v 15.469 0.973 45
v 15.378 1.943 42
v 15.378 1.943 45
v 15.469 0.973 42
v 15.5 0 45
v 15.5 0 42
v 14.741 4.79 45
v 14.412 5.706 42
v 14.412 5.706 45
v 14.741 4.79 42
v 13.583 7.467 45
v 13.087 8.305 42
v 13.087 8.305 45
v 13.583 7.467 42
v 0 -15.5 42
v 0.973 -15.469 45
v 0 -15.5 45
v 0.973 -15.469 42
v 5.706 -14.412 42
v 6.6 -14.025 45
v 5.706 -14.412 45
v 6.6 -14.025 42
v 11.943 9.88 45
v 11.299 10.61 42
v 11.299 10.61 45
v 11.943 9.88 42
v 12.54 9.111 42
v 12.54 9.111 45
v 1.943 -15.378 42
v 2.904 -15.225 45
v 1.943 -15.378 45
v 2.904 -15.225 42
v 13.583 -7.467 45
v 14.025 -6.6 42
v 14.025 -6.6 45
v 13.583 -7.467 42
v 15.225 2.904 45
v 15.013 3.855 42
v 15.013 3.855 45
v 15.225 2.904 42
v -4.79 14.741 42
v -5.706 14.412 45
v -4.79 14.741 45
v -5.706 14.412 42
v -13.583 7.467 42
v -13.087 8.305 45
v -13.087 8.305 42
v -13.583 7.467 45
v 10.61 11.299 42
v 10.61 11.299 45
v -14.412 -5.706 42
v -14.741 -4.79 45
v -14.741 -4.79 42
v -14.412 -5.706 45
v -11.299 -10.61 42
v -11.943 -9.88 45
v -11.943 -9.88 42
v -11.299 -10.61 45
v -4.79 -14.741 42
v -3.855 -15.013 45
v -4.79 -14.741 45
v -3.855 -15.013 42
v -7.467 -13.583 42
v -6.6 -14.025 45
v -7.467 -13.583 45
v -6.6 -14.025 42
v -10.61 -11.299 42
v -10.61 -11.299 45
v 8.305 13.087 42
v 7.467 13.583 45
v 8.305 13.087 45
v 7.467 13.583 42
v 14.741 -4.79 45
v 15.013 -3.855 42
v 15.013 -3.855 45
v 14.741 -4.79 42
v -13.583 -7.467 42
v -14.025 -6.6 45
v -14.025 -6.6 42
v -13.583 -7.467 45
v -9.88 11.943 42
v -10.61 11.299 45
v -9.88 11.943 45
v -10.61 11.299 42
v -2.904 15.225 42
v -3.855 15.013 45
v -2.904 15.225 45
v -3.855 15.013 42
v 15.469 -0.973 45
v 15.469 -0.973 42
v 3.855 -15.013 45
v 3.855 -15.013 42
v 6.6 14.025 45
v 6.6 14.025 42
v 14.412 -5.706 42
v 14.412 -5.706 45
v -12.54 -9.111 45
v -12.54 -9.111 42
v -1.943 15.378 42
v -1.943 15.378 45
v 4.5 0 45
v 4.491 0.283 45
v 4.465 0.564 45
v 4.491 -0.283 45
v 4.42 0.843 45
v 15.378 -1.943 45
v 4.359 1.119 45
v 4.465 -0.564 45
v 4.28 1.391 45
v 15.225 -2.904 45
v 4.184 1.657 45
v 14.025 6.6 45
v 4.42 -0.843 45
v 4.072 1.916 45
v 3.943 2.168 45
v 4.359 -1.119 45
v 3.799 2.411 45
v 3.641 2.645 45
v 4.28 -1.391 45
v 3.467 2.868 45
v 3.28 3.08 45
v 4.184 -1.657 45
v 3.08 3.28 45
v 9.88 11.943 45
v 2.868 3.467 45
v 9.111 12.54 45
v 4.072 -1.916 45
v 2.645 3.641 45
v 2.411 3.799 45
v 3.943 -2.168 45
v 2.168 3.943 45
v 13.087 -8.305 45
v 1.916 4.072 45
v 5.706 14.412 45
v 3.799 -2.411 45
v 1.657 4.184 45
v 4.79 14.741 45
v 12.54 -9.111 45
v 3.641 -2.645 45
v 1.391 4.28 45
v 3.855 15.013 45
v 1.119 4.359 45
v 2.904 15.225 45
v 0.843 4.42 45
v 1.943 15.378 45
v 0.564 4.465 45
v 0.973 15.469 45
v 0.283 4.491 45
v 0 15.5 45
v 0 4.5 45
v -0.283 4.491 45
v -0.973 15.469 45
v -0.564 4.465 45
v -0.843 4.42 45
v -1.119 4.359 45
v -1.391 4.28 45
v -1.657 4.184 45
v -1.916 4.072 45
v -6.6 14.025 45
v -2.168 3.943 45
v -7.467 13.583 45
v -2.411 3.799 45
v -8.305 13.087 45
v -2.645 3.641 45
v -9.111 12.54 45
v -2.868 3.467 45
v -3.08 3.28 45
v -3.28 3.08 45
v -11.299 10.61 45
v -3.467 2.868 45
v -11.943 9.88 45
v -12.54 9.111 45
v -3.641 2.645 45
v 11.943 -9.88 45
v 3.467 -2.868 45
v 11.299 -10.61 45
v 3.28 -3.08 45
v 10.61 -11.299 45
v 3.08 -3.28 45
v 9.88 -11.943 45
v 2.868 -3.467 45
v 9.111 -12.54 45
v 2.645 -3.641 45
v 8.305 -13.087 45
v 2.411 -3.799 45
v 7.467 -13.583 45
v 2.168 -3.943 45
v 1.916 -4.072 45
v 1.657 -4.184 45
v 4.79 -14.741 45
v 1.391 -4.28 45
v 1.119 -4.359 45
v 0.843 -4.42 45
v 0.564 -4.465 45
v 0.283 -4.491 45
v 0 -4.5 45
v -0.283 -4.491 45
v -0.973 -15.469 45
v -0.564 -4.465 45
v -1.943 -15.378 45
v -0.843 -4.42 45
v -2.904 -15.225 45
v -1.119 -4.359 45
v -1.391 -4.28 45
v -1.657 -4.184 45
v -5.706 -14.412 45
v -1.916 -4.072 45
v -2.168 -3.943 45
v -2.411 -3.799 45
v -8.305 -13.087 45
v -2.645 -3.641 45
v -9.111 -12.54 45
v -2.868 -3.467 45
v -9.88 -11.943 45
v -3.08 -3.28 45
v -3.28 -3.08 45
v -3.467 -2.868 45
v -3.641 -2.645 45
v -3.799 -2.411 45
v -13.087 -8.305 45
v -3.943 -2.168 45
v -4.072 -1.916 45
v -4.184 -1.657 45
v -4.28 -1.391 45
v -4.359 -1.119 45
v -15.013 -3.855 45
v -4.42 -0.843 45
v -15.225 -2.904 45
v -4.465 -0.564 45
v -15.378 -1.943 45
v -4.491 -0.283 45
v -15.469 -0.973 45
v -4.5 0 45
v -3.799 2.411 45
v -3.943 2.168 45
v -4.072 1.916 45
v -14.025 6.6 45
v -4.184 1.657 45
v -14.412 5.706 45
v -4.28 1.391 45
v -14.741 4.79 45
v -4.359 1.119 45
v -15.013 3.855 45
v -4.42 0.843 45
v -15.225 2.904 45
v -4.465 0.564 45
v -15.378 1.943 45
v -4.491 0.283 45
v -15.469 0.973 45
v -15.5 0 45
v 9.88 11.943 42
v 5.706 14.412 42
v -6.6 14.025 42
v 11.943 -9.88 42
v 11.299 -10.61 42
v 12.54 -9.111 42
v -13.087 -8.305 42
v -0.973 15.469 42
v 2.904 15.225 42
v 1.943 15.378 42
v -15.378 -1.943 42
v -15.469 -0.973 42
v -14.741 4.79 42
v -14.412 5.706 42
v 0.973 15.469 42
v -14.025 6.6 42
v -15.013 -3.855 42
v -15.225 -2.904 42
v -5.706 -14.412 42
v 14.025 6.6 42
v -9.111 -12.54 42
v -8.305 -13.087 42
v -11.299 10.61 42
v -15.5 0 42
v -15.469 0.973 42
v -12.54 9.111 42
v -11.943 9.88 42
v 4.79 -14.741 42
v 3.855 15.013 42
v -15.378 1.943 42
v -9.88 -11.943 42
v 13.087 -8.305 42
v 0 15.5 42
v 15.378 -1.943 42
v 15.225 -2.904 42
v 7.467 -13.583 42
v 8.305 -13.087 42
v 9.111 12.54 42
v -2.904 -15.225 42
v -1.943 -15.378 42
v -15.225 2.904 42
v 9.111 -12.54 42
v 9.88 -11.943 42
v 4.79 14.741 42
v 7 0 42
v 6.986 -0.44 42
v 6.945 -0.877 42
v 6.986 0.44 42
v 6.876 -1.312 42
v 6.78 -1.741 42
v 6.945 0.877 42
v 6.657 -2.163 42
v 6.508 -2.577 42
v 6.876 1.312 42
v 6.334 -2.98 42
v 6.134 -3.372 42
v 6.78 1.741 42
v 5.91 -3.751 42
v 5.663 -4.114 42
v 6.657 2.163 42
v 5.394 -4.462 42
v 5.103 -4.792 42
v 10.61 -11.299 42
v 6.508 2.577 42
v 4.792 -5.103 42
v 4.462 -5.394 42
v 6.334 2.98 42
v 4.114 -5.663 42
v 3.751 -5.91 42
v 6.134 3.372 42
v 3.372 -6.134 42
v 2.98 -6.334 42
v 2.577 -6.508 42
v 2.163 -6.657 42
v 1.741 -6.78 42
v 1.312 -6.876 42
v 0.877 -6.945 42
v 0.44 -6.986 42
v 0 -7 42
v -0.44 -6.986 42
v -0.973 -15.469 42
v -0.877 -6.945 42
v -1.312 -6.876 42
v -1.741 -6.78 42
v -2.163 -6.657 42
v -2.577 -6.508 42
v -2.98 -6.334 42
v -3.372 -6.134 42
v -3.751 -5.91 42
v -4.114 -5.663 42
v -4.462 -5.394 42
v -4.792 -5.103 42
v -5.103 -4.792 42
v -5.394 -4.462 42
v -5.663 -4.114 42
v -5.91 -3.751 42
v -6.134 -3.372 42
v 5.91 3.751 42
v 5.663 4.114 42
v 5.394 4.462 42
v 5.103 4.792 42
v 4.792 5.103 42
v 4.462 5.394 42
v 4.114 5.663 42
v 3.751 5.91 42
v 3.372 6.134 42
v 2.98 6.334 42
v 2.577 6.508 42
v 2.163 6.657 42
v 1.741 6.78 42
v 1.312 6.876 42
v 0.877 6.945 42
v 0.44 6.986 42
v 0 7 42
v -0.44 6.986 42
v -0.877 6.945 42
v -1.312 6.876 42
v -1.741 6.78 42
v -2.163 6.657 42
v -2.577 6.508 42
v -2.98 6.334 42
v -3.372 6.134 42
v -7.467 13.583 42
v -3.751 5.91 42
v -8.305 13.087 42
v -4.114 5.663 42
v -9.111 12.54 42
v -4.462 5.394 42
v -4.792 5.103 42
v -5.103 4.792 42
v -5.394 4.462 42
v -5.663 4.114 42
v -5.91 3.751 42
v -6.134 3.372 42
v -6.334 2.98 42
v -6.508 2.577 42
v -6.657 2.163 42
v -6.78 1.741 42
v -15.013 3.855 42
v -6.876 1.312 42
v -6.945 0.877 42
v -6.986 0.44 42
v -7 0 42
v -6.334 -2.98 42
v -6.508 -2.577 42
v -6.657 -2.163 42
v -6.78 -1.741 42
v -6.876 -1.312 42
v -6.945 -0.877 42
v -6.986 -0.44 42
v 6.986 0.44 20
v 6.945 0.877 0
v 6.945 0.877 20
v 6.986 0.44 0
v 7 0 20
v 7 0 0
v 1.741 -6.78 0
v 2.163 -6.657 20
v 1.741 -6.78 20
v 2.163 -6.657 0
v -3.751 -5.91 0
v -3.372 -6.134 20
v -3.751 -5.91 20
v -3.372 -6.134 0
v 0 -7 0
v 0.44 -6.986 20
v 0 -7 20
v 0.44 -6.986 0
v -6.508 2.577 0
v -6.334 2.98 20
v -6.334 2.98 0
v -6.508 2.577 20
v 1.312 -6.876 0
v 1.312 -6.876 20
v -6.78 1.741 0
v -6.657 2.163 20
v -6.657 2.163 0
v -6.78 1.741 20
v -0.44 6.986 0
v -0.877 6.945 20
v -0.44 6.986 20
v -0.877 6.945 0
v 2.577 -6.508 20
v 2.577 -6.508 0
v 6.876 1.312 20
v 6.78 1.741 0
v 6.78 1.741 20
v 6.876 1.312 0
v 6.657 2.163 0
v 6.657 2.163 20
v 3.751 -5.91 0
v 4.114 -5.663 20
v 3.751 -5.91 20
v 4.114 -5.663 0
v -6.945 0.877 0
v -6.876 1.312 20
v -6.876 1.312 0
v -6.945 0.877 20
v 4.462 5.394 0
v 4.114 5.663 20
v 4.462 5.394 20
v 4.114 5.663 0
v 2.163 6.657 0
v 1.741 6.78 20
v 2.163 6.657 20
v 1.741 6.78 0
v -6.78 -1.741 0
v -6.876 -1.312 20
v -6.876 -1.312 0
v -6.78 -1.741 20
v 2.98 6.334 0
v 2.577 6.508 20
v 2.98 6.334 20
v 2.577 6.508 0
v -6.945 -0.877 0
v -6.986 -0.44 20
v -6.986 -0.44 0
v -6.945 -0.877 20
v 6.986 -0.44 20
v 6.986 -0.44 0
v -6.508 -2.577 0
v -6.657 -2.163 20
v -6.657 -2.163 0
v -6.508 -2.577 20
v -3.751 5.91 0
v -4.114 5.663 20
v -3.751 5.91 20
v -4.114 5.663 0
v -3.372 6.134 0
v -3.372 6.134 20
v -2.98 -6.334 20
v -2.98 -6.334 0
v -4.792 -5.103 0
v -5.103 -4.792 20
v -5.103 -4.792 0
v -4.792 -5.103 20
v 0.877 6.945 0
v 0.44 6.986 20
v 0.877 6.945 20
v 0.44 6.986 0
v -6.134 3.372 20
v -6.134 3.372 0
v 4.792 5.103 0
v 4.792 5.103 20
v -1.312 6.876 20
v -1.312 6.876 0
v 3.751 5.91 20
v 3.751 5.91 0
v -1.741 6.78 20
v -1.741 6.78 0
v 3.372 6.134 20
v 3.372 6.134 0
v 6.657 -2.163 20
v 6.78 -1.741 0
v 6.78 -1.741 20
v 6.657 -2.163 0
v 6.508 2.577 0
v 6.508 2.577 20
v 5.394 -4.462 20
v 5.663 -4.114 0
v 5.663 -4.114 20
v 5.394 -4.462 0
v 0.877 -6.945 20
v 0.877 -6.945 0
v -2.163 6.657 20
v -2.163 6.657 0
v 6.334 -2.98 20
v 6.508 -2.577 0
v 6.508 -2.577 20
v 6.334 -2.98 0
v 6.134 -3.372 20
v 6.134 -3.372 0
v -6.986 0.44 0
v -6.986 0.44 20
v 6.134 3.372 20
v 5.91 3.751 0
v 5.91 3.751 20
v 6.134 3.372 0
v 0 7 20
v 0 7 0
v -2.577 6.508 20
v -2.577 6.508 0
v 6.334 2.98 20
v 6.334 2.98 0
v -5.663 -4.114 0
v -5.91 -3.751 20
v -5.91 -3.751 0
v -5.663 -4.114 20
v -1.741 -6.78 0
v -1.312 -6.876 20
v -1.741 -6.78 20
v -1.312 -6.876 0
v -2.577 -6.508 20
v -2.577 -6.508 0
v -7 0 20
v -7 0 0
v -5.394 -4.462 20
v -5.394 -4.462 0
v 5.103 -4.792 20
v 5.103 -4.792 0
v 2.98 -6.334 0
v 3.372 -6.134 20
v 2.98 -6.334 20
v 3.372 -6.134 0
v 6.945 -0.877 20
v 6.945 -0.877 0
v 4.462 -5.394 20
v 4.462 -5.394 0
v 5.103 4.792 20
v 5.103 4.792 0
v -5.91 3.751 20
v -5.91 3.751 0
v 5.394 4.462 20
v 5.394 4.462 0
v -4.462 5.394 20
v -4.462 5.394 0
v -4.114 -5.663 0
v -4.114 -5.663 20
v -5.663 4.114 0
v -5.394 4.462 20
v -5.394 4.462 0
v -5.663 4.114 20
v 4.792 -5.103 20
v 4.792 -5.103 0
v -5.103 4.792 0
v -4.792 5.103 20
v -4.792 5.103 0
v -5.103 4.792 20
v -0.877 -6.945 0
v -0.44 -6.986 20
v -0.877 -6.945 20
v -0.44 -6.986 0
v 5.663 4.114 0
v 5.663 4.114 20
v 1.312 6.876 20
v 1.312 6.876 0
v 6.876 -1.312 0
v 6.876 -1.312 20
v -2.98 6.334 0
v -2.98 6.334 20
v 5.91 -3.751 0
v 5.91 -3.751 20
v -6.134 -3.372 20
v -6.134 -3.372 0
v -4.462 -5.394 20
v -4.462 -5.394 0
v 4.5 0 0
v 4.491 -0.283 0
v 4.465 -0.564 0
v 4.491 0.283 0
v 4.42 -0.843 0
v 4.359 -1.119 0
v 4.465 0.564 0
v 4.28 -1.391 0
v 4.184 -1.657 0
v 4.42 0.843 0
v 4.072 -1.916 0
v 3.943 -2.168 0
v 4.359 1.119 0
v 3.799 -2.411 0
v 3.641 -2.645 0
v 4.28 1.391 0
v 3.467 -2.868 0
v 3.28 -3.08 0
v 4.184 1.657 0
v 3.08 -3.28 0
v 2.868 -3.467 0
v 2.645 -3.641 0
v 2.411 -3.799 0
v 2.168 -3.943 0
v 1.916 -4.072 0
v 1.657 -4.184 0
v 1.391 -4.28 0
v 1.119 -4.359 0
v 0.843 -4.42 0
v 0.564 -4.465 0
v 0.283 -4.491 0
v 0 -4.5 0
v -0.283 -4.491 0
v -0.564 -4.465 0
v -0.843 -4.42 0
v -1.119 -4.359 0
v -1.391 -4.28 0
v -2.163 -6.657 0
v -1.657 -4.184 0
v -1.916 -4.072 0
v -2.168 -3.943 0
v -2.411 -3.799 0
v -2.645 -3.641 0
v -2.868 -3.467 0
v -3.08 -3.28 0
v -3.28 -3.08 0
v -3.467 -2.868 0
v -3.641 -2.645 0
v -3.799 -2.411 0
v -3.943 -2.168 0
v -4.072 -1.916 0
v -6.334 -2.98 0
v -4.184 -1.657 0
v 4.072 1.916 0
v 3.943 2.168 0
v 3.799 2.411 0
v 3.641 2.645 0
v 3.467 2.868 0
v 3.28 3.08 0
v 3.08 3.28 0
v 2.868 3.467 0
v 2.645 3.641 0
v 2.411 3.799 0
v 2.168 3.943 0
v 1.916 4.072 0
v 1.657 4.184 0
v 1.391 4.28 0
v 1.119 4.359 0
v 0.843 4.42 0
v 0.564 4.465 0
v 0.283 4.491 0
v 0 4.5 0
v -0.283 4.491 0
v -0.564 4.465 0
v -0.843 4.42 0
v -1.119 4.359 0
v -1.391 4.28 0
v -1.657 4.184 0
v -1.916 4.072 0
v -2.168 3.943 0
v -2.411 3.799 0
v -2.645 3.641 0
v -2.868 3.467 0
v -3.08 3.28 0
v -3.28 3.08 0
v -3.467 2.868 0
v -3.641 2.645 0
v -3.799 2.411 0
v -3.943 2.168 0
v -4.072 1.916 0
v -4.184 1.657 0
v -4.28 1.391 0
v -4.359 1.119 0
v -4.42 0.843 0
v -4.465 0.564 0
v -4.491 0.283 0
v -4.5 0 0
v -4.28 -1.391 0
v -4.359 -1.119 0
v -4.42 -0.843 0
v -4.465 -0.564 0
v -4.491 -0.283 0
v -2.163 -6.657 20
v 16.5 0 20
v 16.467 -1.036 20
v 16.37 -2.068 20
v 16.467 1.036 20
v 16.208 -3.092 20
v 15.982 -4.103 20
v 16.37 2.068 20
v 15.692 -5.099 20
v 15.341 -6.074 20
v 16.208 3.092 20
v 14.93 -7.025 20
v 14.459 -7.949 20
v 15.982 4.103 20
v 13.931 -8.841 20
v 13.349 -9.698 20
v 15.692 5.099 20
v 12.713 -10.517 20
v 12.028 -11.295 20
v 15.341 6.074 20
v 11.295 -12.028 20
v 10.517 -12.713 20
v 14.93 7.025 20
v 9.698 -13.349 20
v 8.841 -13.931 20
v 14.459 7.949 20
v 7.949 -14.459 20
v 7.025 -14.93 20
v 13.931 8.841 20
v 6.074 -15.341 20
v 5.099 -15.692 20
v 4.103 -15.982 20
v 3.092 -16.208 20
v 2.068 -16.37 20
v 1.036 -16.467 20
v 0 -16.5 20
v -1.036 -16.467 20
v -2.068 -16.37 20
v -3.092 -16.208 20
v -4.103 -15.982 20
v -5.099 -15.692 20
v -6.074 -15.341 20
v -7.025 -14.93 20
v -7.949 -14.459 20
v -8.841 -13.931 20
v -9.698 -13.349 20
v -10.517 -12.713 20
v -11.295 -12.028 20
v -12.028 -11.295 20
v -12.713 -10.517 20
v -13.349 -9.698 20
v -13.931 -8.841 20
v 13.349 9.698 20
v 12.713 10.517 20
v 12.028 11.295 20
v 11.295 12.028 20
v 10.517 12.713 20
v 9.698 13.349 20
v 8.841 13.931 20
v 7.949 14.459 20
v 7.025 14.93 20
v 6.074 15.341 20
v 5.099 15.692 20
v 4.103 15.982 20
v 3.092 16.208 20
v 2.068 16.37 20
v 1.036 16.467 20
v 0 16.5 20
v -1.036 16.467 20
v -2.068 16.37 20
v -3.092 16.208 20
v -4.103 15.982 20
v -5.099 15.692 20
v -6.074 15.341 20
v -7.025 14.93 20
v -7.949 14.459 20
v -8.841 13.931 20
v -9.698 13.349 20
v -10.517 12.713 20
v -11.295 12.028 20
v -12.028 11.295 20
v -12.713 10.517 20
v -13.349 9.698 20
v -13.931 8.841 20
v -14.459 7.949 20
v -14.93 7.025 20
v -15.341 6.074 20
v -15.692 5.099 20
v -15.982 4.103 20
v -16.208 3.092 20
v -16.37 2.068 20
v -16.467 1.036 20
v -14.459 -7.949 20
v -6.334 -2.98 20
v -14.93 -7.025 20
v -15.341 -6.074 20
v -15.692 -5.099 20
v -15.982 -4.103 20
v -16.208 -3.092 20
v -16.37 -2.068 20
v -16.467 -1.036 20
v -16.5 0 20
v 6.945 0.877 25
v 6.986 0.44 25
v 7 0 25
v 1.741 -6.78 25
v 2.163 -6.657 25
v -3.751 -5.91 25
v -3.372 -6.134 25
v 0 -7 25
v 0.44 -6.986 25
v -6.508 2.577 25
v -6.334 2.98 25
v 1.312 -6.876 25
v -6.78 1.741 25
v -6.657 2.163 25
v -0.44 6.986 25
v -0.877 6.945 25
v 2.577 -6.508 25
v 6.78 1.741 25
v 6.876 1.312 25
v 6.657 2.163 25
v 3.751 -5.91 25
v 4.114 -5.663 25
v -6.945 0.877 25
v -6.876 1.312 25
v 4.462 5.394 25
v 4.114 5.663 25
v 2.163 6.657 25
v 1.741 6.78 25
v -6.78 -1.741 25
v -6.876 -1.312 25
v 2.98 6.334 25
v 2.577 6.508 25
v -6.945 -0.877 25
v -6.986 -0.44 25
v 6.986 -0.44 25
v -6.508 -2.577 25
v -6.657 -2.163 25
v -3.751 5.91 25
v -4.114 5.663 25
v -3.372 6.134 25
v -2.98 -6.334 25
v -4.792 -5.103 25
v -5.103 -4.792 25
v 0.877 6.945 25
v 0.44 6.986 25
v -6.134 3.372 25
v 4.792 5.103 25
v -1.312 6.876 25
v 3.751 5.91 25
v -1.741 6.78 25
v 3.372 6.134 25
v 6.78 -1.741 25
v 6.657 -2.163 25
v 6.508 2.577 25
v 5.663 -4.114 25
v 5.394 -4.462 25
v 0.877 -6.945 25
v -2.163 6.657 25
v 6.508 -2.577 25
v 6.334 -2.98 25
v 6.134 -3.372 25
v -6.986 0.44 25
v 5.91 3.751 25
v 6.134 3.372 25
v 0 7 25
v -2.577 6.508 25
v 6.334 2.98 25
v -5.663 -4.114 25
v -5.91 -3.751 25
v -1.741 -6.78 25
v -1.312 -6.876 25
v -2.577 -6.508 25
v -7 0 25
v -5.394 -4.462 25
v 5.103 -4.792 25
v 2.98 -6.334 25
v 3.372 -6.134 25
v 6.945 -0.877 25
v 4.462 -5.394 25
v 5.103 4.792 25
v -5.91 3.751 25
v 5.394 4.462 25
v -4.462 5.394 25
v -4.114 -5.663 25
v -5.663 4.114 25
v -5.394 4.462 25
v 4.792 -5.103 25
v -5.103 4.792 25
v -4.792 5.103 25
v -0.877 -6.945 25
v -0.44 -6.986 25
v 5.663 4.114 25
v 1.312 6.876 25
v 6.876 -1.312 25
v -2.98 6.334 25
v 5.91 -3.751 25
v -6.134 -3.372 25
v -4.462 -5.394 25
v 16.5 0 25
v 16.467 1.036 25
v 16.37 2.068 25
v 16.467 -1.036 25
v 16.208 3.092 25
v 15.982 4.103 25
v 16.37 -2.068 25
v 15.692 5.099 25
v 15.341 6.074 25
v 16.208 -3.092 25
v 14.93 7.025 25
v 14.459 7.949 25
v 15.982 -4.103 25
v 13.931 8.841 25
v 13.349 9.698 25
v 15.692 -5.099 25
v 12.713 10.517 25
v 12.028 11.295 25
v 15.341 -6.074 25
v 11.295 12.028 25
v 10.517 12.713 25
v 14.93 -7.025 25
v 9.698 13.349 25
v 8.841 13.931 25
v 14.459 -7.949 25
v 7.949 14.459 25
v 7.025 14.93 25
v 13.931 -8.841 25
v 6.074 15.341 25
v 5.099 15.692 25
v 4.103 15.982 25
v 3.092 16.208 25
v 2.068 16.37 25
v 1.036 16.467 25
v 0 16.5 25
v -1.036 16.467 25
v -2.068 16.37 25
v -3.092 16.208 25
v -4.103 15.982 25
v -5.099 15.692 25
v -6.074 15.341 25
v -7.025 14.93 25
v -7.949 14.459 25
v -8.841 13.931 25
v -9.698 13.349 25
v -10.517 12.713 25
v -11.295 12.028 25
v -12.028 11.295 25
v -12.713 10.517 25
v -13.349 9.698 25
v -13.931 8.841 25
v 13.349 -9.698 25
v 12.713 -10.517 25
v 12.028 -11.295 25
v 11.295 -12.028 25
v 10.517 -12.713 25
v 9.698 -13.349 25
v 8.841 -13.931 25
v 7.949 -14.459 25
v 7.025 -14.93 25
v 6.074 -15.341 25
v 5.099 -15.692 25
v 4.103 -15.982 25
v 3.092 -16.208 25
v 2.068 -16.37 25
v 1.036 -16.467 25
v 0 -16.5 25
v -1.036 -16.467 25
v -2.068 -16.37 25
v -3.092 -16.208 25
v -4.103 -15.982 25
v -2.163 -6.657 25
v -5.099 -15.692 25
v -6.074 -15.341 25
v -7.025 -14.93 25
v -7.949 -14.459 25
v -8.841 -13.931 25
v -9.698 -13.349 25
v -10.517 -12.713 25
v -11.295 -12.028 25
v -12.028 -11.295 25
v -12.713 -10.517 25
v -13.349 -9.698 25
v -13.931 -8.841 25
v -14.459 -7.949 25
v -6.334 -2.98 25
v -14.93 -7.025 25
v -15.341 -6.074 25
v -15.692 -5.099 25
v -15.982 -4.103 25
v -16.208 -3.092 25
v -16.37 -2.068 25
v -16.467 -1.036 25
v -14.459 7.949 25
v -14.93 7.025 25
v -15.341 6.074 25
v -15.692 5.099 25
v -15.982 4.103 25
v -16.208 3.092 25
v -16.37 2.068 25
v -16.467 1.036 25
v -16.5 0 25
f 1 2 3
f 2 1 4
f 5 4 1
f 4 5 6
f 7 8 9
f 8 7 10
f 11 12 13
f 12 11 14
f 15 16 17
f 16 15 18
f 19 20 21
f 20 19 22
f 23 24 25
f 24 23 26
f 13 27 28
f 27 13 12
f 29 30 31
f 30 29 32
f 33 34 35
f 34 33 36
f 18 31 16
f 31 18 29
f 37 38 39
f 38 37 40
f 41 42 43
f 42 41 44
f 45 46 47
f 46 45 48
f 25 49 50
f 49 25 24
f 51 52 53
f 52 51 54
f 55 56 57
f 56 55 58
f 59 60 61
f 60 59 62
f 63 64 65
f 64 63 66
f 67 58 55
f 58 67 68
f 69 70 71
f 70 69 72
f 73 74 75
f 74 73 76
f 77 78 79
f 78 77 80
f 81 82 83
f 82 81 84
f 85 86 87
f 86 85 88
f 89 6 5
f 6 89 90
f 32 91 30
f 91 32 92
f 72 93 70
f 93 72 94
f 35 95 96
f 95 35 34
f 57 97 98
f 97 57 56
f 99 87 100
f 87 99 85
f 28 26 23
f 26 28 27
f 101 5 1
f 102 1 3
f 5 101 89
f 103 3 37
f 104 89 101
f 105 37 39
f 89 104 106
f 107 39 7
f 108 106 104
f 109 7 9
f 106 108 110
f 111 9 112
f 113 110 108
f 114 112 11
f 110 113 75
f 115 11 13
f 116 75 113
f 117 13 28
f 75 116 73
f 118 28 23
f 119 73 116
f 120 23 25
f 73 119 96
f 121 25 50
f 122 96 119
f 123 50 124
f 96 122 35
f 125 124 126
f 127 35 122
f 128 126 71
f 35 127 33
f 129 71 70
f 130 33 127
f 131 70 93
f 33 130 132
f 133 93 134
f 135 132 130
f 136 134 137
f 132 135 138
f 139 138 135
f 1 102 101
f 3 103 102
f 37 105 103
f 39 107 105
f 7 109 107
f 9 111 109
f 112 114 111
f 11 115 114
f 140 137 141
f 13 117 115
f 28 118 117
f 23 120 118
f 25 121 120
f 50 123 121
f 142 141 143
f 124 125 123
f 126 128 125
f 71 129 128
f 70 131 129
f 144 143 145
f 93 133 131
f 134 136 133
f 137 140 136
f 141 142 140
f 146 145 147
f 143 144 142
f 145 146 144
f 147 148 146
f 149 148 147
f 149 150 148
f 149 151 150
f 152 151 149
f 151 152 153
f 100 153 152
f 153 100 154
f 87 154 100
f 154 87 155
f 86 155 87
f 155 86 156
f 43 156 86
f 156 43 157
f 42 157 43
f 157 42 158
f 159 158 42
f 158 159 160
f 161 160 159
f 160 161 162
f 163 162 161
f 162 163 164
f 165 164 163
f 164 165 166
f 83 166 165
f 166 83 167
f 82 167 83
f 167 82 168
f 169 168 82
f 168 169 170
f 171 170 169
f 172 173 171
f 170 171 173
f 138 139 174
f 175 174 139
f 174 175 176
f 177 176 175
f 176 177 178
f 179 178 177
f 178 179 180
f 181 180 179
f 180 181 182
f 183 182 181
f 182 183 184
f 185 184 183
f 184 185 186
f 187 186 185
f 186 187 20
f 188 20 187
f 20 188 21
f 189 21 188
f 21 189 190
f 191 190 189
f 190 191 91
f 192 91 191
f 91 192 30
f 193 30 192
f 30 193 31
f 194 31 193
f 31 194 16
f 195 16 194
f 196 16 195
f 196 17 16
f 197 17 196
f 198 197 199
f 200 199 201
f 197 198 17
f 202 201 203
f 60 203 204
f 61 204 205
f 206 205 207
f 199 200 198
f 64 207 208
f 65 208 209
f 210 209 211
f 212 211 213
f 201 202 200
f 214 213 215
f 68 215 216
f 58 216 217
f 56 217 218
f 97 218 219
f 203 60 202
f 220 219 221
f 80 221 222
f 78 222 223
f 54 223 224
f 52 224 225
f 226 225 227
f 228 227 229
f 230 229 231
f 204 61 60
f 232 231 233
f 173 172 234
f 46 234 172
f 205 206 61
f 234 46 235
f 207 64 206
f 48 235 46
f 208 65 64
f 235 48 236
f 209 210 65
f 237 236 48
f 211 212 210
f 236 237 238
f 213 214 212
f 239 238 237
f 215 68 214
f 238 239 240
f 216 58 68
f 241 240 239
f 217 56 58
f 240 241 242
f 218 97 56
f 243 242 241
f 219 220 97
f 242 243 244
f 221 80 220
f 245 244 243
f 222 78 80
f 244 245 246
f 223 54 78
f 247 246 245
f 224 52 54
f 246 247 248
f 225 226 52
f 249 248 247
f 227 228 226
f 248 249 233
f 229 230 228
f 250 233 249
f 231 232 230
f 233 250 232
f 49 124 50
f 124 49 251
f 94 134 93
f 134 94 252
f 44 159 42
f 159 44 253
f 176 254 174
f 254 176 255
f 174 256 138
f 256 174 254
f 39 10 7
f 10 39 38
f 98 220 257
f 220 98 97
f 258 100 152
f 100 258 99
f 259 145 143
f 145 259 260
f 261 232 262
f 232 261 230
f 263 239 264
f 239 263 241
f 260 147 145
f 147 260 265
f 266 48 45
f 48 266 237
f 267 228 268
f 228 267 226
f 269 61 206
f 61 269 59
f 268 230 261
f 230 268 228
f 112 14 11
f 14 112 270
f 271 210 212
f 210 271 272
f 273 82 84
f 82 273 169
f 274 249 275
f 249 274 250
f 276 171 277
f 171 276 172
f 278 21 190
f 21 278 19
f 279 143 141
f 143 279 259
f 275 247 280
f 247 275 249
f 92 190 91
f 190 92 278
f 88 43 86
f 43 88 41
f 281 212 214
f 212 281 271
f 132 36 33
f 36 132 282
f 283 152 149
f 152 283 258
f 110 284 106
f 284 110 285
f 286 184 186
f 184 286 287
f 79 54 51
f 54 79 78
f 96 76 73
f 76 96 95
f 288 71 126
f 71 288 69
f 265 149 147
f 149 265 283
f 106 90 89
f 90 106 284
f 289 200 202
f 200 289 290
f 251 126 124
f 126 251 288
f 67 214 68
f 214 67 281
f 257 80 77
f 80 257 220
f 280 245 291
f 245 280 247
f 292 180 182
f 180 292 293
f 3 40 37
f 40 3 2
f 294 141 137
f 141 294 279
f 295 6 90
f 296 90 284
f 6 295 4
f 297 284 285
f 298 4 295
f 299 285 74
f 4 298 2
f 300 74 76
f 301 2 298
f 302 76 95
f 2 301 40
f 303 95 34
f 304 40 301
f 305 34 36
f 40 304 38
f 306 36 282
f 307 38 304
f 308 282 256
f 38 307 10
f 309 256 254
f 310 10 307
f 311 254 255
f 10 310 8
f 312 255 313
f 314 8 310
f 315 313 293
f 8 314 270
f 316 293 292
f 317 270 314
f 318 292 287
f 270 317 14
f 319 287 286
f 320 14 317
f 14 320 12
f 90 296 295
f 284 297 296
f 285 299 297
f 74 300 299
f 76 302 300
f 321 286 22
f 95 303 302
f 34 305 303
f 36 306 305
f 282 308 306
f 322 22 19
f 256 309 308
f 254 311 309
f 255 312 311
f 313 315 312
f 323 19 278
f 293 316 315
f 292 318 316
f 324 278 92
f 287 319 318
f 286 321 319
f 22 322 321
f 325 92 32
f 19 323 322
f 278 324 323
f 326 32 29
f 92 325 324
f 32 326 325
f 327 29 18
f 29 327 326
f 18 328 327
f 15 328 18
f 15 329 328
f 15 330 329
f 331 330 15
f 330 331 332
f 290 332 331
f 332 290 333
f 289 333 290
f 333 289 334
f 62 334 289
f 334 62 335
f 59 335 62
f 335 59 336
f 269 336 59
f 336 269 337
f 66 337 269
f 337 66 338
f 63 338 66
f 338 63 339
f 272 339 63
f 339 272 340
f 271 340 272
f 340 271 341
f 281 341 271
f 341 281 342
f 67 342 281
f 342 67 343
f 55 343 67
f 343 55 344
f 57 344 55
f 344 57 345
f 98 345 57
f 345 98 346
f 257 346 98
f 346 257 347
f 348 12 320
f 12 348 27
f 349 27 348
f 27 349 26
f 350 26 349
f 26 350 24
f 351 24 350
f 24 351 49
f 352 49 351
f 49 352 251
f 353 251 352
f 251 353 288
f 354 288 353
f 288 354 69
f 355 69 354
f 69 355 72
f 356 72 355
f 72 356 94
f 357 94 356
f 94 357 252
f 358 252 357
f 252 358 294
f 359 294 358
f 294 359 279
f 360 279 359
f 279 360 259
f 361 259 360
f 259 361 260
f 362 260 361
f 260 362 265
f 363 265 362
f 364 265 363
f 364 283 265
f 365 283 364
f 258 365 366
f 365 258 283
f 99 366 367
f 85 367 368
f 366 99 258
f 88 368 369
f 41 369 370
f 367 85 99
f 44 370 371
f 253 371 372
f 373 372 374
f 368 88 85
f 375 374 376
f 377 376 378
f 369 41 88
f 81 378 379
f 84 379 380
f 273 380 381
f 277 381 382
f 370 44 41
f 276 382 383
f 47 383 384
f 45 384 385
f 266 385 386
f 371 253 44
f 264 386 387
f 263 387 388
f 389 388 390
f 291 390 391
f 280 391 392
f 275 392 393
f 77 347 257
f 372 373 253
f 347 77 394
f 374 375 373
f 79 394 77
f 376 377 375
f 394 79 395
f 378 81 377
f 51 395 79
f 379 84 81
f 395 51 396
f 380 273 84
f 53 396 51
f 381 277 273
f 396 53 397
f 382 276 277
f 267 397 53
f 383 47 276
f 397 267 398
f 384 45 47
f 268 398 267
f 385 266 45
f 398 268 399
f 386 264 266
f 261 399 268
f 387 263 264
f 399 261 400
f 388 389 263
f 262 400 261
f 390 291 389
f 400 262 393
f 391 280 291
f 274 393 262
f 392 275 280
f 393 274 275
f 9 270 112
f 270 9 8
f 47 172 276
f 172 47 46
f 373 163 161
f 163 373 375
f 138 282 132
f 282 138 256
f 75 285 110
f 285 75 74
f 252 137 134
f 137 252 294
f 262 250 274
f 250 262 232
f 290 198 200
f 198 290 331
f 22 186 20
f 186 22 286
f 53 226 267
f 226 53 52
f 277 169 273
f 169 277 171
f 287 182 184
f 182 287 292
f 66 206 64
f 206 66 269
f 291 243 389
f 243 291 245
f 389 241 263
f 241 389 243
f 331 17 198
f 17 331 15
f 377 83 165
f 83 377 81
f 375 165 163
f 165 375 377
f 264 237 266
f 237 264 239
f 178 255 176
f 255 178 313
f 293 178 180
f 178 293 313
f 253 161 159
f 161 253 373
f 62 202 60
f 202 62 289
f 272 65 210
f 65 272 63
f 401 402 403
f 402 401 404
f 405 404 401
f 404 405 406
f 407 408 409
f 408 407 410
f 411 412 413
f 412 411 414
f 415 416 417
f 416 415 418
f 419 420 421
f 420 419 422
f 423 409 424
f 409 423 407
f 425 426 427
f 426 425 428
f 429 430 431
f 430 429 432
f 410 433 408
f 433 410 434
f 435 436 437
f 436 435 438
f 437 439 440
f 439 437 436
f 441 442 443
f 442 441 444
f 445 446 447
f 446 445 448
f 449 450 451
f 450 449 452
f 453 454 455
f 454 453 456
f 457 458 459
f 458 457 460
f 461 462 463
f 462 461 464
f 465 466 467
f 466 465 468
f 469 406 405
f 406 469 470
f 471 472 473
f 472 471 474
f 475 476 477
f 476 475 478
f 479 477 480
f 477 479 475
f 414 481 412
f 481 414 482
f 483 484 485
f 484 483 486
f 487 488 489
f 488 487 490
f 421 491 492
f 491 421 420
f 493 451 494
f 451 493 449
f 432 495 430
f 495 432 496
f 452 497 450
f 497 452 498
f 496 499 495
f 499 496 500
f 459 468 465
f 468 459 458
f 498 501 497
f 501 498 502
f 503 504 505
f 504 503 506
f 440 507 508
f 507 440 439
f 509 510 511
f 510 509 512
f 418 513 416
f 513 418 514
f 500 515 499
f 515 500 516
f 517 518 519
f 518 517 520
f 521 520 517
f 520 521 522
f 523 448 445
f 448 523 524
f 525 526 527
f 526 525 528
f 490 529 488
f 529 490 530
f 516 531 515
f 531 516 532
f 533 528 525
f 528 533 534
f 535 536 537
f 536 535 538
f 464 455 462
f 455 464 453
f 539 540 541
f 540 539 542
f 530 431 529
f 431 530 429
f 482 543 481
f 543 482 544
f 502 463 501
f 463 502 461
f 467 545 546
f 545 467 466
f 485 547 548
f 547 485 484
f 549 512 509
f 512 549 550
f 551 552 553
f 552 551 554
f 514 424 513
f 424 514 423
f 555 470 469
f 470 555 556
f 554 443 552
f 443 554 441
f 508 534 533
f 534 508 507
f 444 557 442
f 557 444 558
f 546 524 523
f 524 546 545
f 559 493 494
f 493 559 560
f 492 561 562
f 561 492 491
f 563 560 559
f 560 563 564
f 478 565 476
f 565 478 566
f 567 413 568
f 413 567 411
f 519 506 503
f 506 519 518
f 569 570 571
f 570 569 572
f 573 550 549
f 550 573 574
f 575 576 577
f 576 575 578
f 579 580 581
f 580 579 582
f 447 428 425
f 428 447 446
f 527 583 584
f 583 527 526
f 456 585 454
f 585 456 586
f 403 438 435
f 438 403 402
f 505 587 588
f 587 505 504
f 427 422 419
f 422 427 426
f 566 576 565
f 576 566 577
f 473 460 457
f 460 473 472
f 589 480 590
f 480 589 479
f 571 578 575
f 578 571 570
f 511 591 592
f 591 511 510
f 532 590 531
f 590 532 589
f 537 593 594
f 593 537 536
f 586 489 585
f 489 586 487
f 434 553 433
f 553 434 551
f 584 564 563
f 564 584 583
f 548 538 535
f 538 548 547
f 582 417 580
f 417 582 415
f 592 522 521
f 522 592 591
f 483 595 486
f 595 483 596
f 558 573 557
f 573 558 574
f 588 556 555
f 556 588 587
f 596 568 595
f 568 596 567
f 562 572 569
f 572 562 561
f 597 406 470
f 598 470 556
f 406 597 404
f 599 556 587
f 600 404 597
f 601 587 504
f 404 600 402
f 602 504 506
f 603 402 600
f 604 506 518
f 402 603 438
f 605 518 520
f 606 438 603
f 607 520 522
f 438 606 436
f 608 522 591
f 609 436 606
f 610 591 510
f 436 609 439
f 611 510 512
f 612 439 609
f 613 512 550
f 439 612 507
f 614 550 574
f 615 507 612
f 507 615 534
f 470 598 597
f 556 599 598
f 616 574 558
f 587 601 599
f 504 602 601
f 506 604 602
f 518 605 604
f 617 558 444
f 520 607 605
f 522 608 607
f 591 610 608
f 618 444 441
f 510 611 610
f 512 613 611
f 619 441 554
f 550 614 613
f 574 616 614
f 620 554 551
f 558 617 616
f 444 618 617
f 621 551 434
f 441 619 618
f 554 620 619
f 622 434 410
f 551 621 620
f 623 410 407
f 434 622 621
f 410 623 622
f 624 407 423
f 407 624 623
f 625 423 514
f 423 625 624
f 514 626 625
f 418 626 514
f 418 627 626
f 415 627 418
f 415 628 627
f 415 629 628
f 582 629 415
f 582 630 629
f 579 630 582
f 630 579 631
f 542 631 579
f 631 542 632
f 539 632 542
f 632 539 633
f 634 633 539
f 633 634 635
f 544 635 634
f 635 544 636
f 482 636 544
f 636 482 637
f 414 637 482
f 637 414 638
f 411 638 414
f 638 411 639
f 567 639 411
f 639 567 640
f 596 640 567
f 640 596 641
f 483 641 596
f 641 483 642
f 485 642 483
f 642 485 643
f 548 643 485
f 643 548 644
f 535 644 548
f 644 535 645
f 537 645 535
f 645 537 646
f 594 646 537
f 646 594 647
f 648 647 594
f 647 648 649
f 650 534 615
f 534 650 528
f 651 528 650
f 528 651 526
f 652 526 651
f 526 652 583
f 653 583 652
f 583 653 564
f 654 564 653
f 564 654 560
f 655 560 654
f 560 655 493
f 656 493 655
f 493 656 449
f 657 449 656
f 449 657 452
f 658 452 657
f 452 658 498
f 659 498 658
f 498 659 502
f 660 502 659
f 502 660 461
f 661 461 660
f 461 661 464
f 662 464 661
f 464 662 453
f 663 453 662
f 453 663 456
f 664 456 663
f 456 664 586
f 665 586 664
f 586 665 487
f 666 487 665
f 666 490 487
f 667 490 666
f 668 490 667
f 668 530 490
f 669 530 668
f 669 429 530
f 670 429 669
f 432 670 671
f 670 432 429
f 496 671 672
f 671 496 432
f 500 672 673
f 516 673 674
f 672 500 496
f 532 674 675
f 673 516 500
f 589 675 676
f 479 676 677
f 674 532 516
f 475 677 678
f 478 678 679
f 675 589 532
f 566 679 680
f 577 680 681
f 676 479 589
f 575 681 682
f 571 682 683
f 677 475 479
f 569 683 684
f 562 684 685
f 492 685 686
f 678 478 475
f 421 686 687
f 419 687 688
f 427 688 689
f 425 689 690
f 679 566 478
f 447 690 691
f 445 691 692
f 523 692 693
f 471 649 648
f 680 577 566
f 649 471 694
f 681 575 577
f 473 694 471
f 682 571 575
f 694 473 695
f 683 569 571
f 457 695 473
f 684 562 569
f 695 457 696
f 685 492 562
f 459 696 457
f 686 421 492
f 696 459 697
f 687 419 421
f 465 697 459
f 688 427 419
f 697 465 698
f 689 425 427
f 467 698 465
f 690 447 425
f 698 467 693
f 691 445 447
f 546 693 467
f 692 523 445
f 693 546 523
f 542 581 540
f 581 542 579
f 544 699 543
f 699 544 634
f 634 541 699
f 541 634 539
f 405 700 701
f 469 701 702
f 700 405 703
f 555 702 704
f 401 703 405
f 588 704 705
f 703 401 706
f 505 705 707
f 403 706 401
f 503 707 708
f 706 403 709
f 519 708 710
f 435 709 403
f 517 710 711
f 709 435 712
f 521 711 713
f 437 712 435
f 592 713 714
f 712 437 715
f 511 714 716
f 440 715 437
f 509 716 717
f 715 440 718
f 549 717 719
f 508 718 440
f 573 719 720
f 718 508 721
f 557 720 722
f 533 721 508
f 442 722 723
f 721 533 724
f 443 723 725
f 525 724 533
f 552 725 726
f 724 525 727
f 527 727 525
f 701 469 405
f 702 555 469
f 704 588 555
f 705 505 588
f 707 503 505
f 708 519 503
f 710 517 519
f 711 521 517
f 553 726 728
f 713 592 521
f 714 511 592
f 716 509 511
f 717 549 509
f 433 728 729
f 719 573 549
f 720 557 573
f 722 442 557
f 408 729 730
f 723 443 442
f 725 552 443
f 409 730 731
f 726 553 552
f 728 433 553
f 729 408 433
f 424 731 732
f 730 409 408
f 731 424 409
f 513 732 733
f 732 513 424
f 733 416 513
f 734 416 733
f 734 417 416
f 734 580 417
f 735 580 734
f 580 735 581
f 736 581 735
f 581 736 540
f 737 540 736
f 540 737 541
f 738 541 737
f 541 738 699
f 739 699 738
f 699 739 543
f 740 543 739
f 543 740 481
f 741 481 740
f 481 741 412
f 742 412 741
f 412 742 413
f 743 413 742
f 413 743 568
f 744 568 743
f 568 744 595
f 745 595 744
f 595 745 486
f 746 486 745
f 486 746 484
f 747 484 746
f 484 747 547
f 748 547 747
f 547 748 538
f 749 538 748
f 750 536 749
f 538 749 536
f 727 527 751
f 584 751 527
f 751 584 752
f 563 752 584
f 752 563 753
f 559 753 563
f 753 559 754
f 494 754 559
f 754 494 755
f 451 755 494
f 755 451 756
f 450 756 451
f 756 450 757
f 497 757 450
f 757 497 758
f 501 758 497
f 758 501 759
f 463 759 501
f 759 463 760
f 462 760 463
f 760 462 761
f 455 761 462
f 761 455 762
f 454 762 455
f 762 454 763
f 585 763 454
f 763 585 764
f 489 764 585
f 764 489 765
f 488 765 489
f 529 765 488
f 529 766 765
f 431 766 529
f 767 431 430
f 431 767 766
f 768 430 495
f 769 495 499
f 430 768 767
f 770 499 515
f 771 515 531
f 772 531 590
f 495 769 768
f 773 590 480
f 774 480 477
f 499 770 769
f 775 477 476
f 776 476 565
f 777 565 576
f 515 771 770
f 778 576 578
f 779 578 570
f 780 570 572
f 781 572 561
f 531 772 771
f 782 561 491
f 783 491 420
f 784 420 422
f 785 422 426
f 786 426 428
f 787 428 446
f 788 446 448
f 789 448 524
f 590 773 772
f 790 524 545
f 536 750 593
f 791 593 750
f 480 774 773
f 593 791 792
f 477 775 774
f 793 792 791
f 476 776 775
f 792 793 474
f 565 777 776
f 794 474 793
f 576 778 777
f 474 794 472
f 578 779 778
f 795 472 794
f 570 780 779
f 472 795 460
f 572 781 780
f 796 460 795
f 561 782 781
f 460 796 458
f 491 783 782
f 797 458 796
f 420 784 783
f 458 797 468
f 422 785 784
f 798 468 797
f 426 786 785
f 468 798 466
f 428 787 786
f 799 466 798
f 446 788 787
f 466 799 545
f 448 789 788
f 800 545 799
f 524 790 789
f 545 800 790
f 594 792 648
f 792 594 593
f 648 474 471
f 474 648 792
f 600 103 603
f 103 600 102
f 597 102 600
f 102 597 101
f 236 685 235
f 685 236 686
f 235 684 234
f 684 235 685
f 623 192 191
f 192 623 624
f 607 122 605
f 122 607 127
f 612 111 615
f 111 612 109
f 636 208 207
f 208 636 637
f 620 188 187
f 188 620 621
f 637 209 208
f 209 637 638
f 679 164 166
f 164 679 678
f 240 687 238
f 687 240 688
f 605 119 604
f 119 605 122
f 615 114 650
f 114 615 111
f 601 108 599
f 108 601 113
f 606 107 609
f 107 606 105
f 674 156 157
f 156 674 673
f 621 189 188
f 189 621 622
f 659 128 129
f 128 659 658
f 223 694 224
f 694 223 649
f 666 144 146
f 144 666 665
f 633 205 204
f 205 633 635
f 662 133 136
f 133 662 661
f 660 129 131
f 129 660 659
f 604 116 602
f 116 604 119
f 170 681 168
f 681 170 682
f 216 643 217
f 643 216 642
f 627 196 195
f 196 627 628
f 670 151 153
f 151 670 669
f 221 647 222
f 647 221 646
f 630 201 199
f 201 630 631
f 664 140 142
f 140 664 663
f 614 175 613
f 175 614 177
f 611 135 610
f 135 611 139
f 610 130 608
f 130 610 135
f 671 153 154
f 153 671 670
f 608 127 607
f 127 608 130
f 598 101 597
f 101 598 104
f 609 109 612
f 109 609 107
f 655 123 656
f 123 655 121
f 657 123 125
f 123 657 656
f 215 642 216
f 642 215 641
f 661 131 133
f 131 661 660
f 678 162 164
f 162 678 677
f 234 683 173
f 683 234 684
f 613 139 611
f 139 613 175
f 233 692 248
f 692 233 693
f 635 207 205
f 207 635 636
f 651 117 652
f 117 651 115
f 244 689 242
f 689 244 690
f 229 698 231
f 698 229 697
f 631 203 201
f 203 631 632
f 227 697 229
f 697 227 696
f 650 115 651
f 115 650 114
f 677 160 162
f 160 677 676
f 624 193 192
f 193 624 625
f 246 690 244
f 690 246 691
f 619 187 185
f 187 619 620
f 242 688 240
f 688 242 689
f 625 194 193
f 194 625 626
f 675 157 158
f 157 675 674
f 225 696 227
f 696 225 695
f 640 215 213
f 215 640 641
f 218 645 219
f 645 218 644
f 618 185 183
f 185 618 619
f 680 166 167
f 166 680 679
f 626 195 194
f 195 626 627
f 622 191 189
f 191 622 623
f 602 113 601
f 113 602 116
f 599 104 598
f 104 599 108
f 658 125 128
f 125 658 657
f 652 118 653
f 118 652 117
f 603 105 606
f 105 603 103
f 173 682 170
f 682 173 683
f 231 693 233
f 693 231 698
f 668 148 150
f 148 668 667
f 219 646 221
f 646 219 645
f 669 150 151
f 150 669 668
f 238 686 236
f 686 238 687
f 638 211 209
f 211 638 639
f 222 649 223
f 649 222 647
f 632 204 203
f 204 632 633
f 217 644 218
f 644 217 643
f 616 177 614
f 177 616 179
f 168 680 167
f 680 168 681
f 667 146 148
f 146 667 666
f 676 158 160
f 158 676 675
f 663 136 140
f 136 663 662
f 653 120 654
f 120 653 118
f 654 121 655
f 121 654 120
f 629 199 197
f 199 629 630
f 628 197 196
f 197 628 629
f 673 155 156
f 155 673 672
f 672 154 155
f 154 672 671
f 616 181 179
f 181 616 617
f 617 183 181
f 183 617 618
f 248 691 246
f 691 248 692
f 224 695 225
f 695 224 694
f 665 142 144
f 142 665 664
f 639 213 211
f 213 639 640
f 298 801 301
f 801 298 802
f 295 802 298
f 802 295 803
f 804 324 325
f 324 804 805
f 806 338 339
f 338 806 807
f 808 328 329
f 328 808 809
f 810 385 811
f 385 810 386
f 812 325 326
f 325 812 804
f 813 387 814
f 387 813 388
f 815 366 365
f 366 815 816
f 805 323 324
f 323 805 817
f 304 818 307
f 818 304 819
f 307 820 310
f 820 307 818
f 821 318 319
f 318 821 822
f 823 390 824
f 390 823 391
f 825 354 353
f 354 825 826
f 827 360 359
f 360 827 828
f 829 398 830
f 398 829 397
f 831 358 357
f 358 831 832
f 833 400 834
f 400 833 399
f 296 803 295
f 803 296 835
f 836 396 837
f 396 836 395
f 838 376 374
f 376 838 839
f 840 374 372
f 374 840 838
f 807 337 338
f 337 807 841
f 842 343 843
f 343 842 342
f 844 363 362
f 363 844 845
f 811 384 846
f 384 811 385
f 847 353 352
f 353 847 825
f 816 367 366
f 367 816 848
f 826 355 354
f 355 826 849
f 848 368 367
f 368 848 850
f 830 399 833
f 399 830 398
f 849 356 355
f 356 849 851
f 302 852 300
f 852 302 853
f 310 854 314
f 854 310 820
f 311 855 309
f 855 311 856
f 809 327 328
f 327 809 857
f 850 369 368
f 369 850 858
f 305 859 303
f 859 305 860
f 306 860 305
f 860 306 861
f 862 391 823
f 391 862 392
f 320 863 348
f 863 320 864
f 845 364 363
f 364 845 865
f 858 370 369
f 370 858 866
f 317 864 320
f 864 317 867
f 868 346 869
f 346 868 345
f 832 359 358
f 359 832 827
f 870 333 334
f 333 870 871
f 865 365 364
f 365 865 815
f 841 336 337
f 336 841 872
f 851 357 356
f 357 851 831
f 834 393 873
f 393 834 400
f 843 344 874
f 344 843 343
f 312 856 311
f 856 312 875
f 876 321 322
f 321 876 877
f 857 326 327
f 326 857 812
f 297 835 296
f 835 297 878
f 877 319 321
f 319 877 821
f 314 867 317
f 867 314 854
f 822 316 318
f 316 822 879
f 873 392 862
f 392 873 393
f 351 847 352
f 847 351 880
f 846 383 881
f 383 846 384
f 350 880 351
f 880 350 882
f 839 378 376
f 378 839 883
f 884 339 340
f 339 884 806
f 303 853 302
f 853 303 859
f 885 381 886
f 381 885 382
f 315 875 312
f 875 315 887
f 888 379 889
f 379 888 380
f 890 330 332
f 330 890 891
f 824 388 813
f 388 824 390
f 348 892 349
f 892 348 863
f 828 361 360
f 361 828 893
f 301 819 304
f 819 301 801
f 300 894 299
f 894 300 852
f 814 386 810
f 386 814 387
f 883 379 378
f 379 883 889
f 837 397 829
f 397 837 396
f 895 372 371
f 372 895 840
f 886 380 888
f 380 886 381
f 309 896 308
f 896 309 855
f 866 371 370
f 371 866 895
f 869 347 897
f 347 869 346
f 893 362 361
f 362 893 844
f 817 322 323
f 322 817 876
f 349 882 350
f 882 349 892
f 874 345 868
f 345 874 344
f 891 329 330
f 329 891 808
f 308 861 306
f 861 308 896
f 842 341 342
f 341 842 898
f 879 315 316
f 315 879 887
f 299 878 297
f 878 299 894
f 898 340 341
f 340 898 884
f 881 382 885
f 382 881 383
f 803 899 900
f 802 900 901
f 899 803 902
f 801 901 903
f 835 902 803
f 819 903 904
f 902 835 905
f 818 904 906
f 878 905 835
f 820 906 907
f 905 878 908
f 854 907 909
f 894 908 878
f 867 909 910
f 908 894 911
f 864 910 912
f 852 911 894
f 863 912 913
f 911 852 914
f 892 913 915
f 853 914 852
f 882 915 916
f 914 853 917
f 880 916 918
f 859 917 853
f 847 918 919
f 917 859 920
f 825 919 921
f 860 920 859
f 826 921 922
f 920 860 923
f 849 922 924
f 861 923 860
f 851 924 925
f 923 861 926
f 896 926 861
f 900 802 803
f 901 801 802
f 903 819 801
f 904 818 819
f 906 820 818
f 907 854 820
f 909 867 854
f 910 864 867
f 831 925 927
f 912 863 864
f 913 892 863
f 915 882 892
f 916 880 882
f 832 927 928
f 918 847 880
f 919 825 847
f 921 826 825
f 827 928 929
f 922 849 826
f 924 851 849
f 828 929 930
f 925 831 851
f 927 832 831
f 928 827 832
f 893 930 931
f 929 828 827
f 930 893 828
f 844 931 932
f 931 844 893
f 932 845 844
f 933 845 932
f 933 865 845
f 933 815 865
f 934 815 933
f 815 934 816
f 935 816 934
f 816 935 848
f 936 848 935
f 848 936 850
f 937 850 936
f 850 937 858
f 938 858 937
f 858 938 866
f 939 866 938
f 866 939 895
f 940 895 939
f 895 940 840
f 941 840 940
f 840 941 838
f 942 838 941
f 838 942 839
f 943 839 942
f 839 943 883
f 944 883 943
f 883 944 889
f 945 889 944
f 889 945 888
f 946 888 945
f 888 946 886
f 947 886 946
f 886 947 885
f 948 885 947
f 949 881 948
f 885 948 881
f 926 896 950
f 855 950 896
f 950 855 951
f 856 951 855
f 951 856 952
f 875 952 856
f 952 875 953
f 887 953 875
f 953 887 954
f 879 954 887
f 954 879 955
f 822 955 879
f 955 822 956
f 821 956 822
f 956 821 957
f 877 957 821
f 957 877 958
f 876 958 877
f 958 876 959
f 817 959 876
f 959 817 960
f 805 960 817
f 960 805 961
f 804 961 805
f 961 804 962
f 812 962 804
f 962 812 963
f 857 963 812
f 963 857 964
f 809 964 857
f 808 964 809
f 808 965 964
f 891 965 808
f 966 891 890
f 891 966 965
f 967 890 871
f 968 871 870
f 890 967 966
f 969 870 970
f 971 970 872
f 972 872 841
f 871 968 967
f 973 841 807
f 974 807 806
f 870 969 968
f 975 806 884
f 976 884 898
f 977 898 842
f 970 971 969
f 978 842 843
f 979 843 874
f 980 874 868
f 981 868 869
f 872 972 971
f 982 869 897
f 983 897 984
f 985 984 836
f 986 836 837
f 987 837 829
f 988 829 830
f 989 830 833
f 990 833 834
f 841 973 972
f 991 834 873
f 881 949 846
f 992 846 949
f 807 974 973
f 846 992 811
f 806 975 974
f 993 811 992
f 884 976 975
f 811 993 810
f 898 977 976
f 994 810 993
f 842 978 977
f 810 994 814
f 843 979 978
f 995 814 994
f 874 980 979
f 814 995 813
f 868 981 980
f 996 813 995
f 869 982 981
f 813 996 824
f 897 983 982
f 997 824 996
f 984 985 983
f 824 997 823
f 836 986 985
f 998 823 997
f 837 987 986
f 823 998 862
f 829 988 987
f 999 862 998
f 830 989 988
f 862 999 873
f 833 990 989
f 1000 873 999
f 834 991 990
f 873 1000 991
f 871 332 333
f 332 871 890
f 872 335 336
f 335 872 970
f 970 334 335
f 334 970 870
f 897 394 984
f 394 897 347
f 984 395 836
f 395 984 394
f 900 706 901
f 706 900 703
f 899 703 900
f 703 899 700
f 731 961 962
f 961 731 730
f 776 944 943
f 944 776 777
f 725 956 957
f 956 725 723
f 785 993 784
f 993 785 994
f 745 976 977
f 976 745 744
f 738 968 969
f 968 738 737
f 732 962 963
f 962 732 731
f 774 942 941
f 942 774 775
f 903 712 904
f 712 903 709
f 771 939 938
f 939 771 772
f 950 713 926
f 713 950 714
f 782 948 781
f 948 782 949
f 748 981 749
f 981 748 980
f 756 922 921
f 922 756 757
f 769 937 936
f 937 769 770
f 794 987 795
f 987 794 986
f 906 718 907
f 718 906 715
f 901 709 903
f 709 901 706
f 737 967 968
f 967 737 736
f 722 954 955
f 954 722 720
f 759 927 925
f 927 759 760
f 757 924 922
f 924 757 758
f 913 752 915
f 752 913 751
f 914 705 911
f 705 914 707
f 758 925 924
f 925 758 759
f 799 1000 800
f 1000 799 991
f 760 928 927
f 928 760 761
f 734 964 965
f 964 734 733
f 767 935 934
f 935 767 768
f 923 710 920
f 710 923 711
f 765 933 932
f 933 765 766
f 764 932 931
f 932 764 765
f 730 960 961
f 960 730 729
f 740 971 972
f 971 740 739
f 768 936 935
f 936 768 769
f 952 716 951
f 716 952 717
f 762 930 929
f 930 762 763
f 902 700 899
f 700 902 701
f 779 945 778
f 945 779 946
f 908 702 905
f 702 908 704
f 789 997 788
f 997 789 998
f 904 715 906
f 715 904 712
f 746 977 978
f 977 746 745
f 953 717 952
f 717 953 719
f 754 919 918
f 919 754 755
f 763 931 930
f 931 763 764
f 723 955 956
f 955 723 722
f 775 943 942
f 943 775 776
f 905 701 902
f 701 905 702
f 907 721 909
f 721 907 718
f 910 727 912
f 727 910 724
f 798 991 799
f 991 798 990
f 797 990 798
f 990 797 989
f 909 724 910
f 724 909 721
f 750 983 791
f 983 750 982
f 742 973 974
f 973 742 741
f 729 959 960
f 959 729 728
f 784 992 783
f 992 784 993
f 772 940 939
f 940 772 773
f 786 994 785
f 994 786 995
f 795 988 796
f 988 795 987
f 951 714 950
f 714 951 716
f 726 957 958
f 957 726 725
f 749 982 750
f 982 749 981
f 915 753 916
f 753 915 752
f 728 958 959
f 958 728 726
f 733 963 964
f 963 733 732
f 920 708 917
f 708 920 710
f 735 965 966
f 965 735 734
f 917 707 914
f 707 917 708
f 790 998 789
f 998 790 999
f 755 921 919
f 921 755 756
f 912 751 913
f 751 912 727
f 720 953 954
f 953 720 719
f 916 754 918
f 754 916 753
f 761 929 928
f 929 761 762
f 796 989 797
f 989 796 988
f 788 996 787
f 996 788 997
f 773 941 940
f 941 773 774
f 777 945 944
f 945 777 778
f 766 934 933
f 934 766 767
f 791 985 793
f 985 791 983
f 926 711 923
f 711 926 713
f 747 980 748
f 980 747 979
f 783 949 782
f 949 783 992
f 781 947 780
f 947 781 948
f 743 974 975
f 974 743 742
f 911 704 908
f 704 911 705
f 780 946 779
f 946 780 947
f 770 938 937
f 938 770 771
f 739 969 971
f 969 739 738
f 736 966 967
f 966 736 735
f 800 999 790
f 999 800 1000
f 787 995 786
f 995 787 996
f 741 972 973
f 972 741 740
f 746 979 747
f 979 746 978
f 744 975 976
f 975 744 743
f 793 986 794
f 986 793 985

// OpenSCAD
// file: ../../../../../shapes/open-cylinder/open-cylinder.scad
// // TODO: Lower this to 50.
module openCylinder(height = 3,
                    outerRadius = 7,
                    innerRadius = 4.5,
                    fn = 100)
{
echo("hi oc");    
    $fn = fn;

    difference()
    {
        cylinder(r=outerRadius,
                 h=height);

        translate([0, 0, -1])
        cylinder(r=innerRadius,
                 h=height+1.01);
    }
}
// file: ../../variable-diameter-round-connector.scad
use <../../../shapes/open-cylinder/open-cylinder.scad>

module roundConnector(bottomHeight = 10,
					  middleHeight = 10,
					  middleOuterRadius = 15,
					  topHeight = 10)
{
	union()
	{
		color("teal")
		translate([0, 0, bottomHeight + middleHeight])
		roundConnector_top(height = topHeight);

		color("magenta")
		translate([0, 0, bottomHeight])
		roundConnector_middle(height = middleHeight,
							  outerRadius = middleOuterRadius);

		color("blue")
		roundConnector_Bottom(height = bottomHeight);
	}
}

module roundConnector_top(height)
{
	openCylinder(height = height);
}

module roundConnector_middle(height, outerRadius)
{
	openCylinder(height = height, outerRadius = outerRadius);
}

module roundConnector_Bottom(height)
{
	openCylinder(height = height);
}
// main file
use <../../variable-diameter-round-connector.scad>

wallThickness = 2;

topHeight = 20;
tor = (31.5 / 2.0) - 0.25;
tir = tor - wallThickness;

bottomHeight = 20;
bor = (25.5 / 2.0) - 0;
bir = bor - wallThickness;

middleHeight = 5;
mor = tor + 1;
mir = bir;

union()
{
//	%
	color("red")
	lampAttachment();

	roundConnector(topHeight = topHeight,
				topInnerRadius = tir,
				topOuterRadius = tor,
				middleHeight = middleHeight,
				middleInnerRadius = mir,
				middleOuterRadius = mor,
				bottomHeight = bottomHeight,
				bottomInnerRadius = bir,
				bottomOuterRadius = bor);
}

module lampAttachment()
{
	height = 3;
	zTranslate = topHeight + middleHeight + bottomHeight - height;

	difference()
	{
		translate([0, 0, zTranslate])
		cylinder(h = height, r = tor, $fn = 100);

		cutoutRadius = 5.25;
		translate([0, 0, zTranslate - 0.1])
		cylinder(h = height + 2, r = cutoutRadius, $fn = 100);
	}
}
